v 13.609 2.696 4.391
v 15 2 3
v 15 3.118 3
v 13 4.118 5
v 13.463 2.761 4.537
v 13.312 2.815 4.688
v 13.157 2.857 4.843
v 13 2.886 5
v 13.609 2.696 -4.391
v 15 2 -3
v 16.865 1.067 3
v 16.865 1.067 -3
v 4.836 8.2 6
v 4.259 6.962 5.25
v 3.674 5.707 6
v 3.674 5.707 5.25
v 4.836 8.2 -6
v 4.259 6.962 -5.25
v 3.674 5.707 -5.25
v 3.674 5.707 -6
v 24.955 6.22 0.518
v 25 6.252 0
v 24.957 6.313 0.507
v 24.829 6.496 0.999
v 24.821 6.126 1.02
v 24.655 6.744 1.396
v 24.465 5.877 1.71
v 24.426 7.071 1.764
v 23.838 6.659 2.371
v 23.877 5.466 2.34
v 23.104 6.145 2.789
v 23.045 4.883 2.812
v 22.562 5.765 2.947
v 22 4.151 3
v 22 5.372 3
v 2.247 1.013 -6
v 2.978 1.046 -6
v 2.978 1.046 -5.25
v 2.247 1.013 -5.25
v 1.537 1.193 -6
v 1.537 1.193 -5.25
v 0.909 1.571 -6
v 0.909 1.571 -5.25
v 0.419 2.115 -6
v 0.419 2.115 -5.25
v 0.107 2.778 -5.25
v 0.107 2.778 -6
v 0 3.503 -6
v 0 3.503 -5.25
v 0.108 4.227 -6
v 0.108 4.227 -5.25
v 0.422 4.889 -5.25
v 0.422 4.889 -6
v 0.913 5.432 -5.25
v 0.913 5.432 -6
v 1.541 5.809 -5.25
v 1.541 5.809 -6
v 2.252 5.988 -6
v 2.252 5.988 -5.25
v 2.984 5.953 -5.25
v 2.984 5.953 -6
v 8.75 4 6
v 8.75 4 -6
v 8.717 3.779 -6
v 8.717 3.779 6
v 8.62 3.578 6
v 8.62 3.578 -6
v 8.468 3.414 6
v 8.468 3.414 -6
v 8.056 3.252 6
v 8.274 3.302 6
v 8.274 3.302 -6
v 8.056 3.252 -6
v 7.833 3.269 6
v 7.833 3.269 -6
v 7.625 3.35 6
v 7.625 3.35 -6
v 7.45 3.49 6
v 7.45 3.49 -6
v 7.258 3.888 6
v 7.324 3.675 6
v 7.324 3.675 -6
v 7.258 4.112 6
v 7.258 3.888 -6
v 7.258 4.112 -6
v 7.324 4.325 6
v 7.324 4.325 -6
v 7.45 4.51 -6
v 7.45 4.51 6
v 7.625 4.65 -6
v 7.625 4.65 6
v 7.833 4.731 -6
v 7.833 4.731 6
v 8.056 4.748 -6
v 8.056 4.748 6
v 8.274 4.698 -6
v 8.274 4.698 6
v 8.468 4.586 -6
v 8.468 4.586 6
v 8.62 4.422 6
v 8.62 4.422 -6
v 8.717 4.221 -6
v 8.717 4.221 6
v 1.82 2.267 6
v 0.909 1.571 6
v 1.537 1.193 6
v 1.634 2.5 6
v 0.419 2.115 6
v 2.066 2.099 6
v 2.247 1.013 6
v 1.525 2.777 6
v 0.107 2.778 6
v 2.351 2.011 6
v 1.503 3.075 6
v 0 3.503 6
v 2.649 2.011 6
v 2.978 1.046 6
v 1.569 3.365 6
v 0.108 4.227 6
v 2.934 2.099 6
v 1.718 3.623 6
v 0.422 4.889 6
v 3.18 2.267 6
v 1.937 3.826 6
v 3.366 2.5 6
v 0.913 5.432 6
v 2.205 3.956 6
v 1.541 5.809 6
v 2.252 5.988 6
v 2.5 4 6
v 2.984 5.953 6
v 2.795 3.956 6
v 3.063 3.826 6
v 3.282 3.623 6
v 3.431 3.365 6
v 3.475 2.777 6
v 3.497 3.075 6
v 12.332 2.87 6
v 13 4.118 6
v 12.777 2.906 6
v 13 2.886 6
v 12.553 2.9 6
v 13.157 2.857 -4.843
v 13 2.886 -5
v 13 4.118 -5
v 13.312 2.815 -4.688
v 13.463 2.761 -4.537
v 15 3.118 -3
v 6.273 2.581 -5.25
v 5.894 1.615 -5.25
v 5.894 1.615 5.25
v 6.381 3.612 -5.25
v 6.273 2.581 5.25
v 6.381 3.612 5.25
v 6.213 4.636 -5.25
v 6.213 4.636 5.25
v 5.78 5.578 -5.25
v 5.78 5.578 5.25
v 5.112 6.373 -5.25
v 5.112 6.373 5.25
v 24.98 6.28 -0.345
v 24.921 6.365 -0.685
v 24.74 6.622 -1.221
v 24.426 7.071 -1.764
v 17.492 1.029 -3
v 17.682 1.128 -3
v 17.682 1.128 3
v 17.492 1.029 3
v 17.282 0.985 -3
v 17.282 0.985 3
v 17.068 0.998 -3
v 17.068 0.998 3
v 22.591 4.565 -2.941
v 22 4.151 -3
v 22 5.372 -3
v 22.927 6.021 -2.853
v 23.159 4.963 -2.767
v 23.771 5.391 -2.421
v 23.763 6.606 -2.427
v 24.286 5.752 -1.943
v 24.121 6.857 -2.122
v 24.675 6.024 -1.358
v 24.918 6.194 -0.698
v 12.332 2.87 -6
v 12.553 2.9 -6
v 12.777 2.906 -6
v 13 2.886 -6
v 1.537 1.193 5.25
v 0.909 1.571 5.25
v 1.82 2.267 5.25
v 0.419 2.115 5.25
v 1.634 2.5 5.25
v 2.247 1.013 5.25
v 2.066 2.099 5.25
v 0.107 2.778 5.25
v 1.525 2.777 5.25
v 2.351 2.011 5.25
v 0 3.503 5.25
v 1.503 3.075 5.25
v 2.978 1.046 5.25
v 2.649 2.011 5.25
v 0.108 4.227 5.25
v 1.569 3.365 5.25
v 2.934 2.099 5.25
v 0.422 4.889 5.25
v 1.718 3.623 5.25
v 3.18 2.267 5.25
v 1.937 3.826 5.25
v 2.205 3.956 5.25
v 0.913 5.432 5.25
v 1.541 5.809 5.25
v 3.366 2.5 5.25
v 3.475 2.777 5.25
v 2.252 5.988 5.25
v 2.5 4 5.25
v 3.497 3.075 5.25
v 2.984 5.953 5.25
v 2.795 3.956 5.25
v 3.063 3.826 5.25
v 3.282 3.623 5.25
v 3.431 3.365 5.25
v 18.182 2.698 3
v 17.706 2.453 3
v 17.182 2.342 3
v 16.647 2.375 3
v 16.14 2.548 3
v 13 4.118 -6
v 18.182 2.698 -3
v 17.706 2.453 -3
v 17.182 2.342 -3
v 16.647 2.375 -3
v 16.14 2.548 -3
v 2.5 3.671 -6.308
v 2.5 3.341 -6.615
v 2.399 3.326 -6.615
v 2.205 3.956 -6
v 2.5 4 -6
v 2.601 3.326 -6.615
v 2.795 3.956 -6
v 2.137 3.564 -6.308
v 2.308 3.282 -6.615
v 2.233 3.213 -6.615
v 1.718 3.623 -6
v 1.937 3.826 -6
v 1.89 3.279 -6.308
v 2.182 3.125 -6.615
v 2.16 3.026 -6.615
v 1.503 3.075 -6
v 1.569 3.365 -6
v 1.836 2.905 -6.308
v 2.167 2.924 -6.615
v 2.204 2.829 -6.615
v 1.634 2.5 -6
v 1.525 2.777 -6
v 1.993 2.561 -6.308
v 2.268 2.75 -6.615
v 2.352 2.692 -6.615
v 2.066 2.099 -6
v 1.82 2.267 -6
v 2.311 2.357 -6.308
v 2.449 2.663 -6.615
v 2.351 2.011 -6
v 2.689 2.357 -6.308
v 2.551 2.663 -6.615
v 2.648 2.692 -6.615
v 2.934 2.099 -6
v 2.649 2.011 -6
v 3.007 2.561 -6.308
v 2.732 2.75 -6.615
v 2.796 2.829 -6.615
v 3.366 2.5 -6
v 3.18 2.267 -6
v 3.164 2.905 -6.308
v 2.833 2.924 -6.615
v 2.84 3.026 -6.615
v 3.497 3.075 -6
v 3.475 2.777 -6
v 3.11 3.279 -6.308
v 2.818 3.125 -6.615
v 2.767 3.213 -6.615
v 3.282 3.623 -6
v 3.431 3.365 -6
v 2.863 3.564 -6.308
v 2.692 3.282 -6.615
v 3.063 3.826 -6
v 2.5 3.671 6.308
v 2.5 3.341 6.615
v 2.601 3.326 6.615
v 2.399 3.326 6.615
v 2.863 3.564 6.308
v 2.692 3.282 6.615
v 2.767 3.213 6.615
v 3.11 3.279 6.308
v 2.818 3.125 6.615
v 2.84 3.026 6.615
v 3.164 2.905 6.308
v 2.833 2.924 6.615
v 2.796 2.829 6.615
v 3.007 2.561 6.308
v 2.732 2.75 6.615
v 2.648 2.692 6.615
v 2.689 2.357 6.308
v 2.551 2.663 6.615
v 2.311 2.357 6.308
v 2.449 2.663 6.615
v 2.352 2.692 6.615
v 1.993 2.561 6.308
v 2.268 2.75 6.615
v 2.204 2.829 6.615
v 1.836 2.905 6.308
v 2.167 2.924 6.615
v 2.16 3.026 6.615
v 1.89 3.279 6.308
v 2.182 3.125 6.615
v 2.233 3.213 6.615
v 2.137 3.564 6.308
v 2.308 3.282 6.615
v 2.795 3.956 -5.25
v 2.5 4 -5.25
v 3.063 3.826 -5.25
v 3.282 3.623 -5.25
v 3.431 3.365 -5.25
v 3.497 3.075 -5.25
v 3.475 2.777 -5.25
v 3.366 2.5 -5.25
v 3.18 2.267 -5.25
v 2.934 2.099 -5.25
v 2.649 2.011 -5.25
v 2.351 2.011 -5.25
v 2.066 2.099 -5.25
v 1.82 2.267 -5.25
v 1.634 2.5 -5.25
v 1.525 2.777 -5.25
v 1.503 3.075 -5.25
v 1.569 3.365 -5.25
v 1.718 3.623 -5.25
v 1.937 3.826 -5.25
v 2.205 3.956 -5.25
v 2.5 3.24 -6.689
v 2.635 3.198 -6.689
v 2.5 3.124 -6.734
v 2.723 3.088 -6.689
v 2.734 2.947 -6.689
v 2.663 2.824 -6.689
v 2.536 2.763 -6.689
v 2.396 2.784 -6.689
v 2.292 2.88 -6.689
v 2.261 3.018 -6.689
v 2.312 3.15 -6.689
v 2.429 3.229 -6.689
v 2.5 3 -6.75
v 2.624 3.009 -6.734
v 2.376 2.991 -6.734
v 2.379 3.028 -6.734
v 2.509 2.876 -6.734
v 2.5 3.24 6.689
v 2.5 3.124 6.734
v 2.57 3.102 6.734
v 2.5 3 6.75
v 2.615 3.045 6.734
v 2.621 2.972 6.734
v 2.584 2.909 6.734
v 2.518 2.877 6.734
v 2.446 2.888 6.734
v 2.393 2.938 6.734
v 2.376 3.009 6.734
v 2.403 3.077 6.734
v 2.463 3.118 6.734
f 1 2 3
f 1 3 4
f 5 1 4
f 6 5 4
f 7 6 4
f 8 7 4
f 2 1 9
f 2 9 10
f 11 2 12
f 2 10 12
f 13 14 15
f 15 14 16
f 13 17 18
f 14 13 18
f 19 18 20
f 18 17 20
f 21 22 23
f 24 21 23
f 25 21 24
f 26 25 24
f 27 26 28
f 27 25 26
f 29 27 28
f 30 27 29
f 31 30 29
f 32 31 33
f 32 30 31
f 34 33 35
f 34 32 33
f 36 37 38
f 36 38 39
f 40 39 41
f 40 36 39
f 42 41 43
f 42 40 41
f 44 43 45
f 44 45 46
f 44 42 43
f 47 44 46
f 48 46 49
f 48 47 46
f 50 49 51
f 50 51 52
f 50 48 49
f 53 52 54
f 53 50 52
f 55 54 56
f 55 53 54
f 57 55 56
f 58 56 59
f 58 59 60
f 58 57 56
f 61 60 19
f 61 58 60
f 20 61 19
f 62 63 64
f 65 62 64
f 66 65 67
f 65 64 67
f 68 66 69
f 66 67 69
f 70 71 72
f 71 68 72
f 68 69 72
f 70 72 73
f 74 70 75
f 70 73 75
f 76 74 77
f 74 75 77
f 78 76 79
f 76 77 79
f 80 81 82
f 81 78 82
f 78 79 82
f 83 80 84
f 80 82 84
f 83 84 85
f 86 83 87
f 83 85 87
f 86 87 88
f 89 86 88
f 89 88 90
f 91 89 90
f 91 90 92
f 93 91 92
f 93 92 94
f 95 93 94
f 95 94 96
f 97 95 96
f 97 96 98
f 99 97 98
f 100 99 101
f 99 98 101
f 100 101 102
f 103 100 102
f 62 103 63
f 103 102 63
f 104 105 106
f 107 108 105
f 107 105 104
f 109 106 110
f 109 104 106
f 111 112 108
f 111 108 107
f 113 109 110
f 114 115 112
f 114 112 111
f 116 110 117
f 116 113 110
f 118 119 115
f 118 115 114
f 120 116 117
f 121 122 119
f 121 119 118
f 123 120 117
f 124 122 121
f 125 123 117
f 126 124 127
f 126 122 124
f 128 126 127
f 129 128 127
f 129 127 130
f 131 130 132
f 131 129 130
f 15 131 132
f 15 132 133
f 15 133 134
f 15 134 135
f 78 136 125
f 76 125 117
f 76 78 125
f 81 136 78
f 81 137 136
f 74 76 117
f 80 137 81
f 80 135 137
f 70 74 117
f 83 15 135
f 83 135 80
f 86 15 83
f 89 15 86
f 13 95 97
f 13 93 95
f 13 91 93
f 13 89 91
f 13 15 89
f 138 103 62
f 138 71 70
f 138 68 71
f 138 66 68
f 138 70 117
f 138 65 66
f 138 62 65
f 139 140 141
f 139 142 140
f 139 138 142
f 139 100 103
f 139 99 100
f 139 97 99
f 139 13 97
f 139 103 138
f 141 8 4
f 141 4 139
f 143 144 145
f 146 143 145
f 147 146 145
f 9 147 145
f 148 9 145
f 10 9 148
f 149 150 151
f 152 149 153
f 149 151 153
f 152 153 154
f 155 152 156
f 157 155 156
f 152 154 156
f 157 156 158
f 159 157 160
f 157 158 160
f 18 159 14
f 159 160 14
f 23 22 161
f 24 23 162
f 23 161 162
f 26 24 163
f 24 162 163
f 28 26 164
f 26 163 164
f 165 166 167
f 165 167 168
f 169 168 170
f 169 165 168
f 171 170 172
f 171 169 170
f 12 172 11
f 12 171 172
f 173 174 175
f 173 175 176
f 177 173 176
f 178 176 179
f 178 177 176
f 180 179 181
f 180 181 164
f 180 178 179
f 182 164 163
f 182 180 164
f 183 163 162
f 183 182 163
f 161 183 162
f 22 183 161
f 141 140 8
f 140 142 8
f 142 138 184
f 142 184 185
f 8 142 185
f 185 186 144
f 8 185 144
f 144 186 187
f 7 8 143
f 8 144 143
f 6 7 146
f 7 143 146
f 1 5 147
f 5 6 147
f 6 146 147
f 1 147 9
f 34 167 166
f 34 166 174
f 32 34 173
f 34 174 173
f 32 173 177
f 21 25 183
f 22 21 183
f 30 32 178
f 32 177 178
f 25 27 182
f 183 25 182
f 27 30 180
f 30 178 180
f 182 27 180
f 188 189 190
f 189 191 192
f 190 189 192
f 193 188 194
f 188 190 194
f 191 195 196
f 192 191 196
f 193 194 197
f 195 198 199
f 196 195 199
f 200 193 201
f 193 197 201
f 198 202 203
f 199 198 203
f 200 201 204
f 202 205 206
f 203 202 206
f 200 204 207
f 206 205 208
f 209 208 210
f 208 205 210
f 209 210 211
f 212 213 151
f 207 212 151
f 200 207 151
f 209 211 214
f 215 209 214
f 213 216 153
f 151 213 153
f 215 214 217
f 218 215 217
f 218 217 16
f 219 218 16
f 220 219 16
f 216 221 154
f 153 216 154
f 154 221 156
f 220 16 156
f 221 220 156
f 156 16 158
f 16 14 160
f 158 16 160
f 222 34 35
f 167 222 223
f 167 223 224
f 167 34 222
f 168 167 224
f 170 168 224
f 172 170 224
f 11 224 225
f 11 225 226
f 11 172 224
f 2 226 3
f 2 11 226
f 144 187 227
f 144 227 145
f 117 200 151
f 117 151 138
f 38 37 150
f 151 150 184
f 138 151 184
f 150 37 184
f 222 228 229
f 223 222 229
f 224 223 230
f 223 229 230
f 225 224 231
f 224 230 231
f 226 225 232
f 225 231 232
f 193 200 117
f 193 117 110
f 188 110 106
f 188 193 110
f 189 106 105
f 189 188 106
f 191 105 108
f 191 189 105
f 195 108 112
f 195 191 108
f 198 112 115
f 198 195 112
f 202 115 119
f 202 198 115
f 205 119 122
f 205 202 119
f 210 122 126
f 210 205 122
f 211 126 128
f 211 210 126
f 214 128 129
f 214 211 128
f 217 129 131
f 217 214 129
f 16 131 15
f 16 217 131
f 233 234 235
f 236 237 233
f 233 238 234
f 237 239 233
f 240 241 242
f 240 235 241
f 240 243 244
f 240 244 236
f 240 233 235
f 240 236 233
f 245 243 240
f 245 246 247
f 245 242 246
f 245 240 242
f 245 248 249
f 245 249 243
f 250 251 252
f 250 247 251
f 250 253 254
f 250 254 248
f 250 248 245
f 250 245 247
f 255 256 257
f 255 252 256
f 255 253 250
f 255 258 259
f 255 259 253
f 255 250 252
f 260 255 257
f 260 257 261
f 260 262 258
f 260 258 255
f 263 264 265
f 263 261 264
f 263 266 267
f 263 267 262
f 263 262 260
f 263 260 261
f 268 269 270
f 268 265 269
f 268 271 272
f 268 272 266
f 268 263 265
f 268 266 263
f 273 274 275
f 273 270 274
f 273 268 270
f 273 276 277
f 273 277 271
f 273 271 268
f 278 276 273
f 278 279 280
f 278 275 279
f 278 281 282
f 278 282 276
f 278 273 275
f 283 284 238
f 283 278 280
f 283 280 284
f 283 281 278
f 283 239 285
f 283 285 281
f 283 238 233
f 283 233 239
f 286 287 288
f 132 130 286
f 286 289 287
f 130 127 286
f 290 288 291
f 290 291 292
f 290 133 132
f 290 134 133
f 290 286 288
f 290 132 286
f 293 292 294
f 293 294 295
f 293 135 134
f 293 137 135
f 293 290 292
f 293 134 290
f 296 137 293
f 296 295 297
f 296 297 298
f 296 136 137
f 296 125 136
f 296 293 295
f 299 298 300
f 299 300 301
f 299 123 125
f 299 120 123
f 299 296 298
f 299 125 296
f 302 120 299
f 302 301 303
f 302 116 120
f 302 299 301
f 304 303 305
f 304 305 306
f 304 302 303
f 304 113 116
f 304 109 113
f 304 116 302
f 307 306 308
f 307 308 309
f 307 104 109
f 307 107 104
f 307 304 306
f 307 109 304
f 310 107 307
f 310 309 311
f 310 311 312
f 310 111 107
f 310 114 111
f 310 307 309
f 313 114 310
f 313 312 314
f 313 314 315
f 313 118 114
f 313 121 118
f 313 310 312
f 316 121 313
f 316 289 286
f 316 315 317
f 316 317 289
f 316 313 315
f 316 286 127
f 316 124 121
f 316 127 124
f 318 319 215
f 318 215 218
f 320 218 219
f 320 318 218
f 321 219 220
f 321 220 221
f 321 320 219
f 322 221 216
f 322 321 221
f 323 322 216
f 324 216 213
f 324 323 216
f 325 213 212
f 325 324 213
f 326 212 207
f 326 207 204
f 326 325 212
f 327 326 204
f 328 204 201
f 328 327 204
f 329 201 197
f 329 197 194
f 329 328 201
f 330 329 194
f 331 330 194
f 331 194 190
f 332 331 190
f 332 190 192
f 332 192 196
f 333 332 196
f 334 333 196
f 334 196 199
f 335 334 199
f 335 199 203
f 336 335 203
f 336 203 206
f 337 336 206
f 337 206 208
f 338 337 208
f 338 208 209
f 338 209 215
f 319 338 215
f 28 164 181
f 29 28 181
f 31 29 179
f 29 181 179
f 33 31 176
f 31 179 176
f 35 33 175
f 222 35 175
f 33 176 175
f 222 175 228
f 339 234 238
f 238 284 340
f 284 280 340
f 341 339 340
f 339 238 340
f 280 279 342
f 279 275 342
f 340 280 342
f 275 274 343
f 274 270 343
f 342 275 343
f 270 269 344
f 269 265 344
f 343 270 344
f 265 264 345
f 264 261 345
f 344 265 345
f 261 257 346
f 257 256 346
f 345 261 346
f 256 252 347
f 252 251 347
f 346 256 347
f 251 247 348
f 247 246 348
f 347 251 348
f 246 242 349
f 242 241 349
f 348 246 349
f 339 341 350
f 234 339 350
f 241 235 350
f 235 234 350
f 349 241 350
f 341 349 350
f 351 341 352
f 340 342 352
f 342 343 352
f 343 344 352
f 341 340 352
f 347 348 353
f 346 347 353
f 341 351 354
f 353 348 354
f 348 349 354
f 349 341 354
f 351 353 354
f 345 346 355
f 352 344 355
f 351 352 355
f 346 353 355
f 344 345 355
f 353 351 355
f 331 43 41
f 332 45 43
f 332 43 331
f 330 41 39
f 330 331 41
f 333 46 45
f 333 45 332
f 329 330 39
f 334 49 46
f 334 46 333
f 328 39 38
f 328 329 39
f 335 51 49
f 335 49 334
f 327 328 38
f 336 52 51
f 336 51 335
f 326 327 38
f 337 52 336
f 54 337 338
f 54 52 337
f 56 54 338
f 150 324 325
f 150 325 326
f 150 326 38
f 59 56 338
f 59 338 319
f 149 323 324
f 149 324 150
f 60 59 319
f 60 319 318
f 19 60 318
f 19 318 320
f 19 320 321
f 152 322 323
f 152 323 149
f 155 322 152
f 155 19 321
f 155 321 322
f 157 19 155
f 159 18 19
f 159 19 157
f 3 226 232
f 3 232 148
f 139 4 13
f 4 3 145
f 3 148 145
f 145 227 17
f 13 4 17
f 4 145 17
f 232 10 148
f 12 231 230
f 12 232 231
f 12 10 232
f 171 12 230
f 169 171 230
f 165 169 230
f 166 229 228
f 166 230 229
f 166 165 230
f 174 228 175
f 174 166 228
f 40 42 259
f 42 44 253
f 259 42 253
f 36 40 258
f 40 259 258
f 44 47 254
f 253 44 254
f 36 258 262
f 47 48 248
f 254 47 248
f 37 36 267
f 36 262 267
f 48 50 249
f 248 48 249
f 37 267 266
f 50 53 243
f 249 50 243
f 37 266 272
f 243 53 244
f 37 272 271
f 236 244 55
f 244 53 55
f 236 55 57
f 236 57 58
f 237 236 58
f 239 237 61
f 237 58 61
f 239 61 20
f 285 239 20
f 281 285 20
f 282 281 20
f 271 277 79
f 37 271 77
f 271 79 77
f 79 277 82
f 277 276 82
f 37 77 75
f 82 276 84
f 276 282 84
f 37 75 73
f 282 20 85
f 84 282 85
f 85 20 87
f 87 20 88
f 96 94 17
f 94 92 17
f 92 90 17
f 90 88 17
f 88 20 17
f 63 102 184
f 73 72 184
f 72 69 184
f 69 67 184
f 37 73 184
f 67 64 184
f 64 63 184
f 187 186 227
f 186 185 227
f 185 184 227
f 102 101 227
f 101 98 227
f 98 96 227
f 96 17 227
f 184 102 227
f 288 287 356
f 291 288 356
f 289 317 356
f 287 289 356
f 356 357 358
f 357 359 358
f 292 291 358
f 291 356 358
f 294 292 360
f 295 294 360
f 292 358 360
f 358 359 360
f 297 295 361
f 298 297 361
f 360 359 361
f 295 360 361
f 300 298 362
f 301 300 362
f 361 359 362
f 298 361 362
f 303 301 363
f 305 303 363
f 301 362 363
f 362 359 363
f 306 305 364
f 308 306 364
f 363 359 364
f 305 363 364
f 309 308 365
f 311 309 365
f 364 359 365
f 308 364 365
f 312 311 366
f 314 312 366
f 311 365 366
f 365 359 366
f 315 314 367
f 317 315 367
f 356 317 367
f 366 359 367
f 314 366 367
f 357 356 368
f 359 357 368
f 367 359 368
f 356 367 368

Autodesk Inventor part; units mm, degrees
sketch "Sketch_1" plane through (0, 0, 0) normal (0, 0, 1) x (1, 0, 0)
  arc A0 (3.6737, 5.7073) -> (2.9784, 1.0462) centre (2.5, 3.5) ccw
  line L0 (2.9784, 1.0462) -> (12.3318, 2.8697)
  arc A1 (13.6089, 2.6955) -> (12.3318, 2.8697) centre (12.7145, 0.9067) ccw
  line L1 (13.6089, 2.6955) -> (16.8654, 1.0673)
  arc A2 (16.8654, 1.0673) -> (17.6821, 1.1275) centre (17.2232, 1.7828) ccw
  line L2 (17.6821, 1.1275) -> (25, 6.2516)
  line L3 (25, 6.2516) -> (24.4264, 7.0707)
  line L4 (24.4264, 7.0707) -> (18.182, 2.6984)
  arc A3 (16.1405, 2.5478) -> (18.182, 2.6984) centre (17.0349, 4.3367) ccw
  line L5 (16.1405, 2.5478) -> (4.8361, 8.2)
  line L6 (4.8361, 8.2) -> (3.6737, 5.7073)
  circle A4 centre (8, 4) radius 0.75
extrude "Extrusion1" add sketch "Sketch_1" along normal mid plane 12
sketch "Sketch_2" plane through (0, 0, 0) normal (0, 0, 1) x (1, 0, 0)
  circle A0 centre (2.5, 3.5) radius 3.8829
extrude "Extrusion2" cut sketch "Sketch_2" along normal mid plane 10.5
sketch "Sketch_3" plane through (0, 0, 0) normal (0, 1, 0) x (-1, 0, 0)
  line L0 (-13, -5) -> (-15, -3)
  line L1 (-15, -3) -> (-22, -3)
  arc A0 (-22, 3) -> (-22, -3) centre (-22, 0) ccw
  line L2 (-22, 3) -> (-15, 3)
  line L3 (-15, 3) -> (-13, 5)
  line L4 (-13, 5) -> (-13, 6)
  line L5 (-13, 6) -> (-30, 6)
  line L6 (-30, 6) -> (-30, -6)
  line L7 (-30, -6) -> (-13, -6)
  line L8 (-13, -6) -> (-13, -5)
extrude "Extrusion3" cut sketch "Sketch_3" along normal blind 15
sketch "Sketch_4" plane through (2.5, 0, 0) normal (1, 0, 0) x (0, 0, -1)
  line L0 (6.75, 3) -> (-6.75, 3)
  arc A0 (-6.6154, 3.3413) -> (-6.75, 3) centre (-6.25, 3) ccw
  line L1 (-6.6154, 3.3413) -> (-6, 4)
  line L2 (-6, 4) -> (6, 4)
  line L3 (6, 4) -> (6.6154, 3.3413)
  arc A1 (6.75, 3) -> (6.6154, 3.3413) centre (6.25, 3) ccw
  line L4 (6.75, 3) -> (-6.75, 3)
revolve "Revolution1" add sketch "Sketch_4" angle 360 about axis through (2.5, 3, -6.75) along (0, 0, -1)
ref_plane "A_XY" through (2.5, 3, 0) normal (0, 0, 1) x (1, 0, 0)
ref_plane "A_YZ" through (2.5, 3, 0) normal (1, 0, 0) x (0, 1, 0)
ref_plane "A_ZX" through (2.5, 3, 0) normal (0, 1, 0) x (0, 0, 1)
ref_plane "B_XY" through (8, 4, 0) normal (0, 0, 1) x (1, 0, 0)
ref_plane "B_YZ" through (8, 4, 0) normal (1, 0, 0) x (0, 1, 0)
ref_plane "B_ZX" through (8, 4, 0) normal (0, 1, 0) x (0, 0, 1)
properties part number "PKWS1-HOOK"
